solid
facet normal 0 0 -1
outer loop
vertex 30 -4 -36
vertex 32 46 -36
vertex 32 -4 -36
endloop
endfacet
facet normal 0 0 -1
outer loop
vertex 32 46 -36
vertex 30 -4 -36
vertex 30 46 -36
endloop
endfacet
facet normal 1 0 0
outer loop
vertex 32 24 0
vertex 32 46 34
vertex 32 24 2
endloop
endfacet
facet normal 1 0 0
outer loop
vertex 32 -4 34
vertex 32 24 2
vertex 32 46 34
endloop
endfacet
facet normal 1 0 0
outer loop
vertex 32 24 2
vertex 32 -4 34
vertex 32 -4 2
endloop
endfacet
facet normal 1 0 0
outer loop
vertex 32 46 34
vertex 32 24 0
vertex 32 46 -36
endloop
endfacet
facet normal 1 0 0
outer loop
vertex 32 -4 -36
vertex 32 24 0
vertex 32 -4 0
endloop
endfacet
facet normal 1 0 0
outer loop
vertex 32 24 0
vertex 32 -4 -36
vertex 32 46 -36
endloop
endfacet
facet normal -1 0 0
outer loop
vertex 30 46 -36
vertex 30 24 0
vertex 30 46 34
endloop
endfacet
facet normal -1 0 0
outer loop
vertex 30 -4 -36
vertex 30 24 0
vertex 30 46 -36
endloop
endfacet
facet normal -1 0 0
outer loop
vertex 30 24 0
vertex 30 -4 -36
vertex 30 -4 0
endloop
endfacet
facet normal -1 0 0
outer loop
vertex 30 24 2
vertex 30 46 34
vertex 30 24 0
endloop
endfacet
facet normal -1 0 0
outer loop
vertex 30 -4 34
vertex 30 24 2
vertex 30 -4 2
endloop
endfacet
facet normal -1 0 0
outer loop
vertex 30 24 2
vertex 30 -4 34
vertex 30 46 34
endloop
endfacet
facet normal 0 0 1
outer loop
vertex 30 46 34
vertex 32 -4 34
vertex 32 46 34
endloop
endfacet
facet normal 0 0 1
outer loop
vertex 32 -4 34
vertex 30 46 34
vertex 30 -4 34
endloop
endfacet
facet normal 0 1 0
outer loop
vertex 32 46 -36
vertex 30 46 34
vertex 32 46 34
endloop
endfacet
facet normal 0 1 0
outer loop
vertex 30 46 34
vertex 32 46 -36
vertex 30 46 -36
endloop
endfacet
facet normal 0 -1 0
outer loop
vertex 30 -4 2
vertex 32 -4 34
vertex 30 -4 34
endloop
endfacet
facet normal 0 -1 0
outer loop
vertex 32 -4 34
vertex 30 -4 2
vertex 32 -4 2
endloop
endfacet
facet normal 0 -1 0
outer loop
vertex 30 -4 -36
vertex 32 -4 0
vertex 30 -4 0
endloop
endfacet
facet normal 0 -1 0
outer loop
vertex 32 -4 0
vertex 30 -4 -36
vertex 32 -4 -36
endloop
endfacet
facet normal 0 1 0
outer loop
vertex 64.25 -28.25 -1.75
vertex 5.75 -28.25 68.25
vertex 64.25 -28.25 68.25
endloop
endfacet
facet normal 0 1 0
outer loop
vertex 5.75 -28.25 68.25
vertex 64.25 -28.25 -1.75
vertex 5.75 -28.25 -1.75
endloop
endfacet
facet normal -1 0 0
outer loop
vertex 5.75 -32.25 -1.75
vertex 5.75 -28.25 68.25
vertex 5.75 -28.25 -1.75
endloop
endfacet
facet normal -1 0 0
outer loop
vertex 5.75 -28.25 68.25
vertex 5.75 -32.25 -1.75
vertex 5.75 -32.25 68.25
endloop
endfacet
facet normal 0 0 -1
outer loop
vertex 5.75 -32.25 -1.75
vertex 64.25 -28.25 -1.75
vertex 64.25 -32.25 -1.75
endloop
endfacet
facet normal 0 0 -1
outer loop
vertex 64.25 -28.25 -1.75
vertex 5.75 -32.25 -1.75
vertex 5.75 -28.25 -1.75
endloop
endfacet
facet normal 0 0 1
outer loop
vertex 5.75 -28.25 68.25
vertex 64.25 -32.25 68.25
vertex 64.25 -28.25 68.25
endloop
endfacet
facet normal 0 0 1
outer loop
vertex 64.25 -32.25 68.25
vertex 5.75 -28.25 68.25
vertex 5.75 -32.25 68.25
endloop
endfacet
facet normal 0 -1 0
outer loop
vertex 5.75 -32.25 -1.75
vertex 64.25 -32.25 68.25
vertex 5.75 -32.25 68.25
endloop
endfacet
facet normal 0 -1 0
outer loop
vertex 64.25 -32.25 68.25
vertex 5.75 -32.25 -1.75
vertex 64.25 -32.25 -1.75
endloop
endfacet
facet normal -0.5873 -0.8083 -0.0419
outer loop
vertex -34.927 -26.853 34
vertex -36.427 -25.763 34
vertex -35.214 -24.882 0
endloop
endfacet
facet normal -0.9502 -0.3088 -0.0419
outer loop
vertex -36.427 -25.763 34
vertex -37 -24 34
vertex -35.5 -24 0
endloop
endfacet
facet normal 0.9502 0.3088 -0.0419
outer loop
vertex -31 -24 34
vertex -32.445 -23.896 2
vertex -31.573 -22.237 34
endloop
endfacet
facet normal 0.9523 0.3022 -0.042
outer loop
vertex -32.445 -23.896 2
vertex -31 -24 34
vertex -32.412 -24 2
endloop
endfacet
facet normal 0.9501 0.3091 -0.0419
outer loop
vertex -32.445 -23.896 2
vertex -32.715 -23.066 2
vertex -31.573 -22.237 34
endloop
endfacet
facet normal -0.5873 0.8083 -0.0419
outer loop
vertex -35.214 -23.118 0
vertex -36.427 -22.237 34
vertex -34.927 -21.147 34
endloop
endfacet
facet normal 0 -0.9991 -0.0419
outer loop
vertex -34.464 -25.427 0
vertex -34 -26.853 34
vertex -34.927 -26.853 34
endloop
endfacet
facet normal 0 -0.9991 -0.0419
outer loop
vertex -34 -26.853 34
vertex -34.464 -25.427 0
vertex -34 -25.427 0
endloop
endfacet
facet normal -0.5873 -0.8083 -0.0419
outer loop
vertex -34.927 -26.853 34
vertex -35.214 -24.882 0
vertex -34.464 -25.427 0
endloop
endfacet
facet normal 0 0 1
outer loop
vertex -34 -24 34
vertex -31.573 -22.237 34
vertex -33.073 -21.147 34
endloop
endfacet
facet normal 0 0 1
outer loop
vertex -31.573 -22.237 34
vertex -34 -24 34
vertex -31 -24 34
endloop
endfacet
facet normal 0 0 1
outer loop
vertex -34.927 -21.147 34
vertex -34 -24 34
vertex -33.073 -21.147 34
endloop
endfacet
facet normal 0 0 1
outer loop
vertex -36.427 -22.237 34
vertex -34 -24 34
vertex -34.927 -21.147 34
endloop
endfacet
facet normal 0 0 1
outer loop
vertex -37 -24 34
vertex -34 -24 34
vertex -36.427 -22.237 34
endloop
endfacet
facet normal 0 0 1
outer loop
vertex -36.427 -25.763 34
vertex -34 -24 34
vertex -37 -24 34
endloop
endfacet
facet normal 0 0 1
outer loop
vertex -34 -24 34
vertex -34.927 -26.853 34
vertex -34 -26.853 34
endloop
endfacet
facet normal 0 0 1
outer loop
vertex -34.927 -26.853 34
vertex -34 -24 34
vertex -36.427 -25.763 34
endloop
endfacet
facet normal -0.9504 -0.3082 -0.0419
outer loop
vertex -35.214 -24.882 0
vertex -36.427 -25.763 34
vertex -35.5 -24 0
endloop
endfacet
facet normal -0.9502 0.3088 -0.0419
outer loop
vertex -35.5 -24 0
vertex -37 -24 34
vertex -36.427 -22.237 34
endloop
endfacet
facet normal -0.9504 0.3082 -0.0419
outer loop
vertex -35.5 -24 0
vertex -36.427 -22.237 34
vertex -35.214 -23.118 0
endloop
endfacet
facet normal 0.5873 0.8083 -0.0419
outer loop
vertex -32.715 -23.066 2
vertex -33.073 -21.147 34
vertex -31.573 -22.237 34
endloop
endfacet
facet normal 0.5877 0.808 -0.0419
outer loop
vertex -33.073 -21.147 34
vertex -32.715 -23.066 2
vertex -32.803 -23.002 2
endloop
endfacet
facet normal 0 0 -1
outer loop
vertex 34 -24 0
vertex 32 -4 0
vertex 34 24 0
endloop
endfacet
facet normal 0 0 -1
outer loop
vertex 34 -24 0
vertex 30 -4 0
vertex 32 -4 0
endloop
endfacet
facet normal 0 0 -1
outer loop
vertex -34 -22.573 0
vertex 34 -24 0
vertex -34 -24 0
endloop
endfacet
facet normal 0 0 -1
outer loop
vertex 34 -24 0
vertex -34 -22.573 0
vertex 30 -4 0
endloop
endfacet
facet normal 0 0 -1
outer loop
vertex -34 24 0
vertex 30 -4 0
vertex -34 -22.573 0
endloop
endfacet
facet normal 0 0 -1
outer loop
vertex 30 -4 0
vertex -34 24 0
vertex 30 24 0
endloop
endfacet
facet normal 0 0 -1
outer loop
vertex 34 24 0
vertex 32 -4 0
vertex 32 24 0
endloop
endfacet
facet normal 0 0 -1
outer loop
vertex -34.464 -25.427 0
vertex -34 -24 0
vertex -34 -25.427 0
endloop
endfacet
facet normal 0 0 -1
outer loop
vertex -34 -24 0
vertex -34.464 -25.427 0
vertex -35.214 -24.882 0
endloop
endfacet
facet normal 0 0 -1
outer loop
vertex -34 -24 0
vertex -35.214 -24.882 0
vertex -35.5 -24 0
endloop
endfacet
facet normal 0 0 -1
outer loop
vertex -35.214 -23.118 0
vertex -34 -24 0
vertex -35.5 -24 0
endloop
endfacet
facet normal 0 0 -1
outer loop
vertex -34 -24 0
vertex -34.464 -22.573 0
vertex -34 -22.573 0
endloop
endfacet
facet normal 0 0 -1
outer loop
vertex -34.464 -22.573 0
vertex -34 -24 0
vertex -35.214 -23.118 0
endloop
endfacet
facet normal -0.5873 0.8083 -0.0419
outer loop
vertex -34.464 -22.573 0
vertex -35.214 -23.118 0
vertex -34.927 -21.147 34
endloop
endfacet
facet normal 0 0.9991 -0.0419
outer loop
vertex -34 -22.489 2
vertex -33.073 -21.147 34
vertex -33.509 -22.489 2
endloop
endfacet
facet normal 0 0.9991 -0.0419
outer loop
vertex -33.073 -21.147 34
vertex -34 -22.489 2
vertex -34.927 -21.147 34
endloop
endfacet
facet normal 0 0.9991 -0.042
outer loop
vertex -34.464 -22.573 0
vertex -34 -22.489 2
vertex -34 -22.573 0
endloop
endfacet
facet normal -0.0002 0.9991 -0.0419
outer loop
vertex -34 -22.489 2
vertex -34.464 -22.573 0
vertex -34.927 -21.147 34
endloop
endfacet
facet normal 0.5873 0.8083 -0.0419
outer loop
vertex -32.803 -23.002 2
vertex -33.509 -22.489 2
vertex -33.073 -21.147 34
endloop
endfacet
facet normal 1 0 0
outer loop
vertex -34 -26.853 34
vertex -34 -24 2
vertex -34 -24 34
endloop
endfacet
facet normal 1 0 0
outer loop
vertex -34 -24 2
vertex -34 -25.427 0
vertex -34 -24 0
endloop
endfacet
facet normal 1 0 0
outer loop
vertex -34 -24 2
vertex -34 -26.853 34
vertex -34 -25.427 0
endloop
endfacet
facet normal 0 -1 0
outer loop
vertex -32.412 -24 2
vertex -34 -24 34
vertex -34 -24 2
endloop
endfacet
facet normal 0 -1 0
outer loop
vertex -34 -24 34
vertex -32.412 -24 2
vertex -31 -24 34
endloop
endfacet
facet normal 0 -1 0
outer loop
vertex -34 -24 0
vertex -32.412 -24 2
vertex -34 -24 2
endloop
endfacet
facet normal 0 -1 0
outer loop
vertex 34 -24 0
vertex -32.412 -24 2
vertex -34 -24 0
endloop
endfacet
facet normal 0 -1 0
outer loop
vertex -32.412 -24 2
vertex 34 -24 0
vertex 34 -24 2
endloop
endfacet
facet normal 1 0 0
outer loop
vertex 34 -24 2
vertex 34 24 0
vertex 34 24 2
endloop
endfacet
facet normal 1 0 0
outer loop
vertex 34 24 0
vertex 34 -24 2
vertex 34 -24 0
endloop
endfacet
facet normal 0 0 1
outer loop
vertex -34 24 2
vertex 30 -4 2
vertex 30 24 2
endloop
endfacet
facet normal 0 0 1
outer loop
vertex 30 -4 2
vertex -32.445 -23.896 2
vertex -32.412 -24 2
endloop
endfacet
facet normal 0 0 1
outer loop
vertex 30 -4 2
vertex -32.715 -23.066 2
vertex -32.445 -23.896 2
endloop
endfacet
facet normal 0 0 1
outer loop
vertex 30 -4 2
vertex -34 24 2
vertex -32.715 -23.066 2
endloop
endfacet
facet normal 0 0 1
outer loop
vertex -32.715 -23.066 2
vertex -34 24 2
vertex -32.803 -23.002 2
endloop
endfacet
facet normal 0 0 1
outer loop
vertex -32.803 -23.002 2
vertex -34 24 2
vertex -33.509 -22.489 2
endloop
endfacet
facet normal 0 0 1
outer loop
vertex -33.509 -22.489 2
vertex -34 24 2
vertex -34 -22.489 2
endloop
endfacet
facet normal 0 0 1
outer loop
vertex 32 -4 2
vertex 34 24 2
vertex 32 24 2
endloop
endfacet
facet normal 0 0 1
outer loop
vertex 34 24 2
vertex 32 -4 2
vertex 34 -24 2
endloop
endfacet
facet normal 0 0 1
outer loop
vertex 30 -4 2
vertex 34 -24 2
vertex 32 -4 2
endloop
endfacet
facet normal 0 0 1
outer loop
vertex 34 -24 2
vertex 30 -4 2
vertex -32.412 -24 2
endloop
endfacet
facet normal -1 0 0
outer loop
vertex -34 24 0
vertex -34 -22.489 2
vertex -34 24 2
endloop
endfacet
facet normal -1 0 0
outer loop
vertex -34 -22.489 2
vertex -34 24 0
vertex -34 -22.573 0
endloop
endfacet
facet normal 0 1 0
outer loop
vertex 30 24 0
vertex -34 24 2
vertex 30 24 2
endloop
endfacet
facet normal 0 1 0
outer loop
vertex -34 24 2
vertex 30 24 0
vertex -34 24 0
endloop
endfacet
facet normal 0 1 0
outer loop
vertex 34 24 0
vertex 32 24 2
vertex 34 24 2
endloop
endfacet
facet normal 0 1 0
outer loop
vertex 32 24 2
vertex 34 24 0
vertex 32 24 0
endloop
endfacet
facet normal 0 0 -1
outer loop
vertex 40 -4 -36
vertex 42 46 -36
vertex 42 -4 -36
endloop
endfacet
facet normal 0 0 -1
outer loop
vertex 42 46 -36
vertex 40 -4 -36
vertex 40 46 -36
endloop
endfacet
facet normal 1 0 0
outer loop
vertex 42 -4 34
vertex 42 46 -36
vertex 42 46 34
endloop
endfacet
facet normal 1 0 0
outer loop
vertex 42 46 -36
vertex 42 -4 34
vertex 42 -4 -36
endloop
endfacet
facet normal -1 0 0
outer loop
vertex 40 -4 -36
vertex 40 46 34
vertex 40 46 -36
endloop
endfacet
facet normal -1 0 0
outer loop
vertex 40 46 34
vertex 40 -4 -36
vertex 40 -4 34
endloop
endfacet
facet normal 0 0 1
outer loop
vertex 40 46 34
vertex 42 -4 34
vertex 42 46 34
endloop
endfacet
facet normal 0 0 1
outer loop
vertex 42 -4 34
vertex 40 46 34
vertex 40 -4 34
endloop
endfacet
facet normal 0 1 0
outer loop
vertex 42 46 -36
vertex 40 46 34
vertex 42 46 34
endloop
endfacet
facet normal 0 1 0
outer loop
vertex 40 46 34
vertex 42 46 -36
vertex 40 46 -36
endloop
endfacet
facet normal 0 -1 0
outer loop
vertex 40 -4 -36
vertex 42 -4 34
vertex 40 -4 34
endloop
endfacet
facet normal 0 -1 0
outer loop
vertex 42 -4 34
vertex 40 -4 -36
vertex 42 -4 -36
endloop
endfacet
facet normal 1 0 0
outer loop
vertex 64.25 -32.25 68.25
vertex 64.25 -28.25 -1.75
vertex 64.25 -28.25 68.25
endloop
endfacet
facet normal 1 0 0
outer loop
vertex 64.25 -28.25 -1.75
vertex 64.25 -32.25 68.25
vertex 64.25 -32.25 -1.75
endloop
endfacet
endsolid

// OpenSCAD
// Dimensions for Part 1: Box (outer size 70x50x30mm, walls=2mm, floor=2mm)
box_outer_width = 70;    // Outer width
box_outer_depth = 50;    // Outer depth
box_height = 30;         // Total height including floor

// Part 1: Box (open top)
module box() {
    translate([-box_outer_width/2 + 1, -box_outer_depth/2 + 1, 0]) {
        // Floor (2mm thick)
        cube([box_outer_width - 2, box_outer_depth - 2, 2]);

        // Walls and top (2mm thick)
        difference() {
            cylinder(h=box_height + 4, r1=1.5, r2=3);
            rotate([90, 0, 0])
                cube([box_outer_width - 2, box_outer_depth - 2, box_height]);
        }
    }
}

// Dimensions for Part 2: Lid (plate + lip)
lid_plate_size = [70, 50];
lid_lip_inner_size = [65.6, 45.6]; // Clearance on each side
lid_lip_thickness = 1.5;
lid_lip_height = 4;

// Part 2: Lid (upside down)
module lid() {
    translate([-lid_plate_size[0]/2 + 1, -lid_plate_size[1]/2 + 1, 0]) {
        // Plate
        cube([lid_plate_size[0], lid_plate_size[1], 2]);

        // Lip cutout (4mm tall, 1.5mm thick)
        difference() {
            rotate([90, 0, 0])
                linear_extrude(height=lid_lip_height) {
                    polygon(points=[
                        [-lid_lip_inner_size[0]/2, -lid_plate_size[1]/2],
                        [ lid_lip_inner_size[0]/2, -lid_plate_size[1]/2],
                        [ lid_lip_inner_size[0]/2,  lid_plate_size[1]/2],
                        [-lid_lip_inner_size[0]/2,  lid_plate_size[1]/2]
                    ]);
                }
            rotate([90, 0, 0])
                linear_extrude(height=lid_lip_height) {
                    polygon(points=[
                        [-lid_plate_size[0]/2, -lid_plate_size[1]/2],
                        [ lid_plate_size[0]/2, -lid_plate_size[1]/2],
                        [ lid_plate_size[0]/2,  lid_plate_size[1]/2],
                        [-lid_plate_size[0]/2,  lid_plate_size[1]/2]
                    ]);
                }
        }

        // Cut out the lip material
        translate([-lid_lip_inner_size[0]/2 + lid_lip_thickness/2,
                  -lid_plate_size[1]/2 + lid_lip_thickness/2, 0])
            rotate([90, 0, 0])
            linear_extrude(height=lid_lip_height) {
                polygon(points=[
                    [-lid_plate_size[0]/2 + lid_lip_inner_size[0]/2,
                     -lid_plate_size[1]/2 + lid_lip_thickness/2],
                    [ lid_plate_size[0]/2 + lid_lip_inner_size[0]/2,
                     -lid_plate_size[1]/2 + lid_lip_thickness/2],
                    [ lid_plate_size[0]/2 + lid_lip_inner_size[0]/2,
                      lid_plate_size[1]/2 - lid_lip_thickness/2],
                    [-lid_plate_size[0]/2 + lid_lip_inner_size[0]/2,
                      lid_plate_size[1]/2 - lid_lip_thickness/2]
                ]);
            }
    }
}

// Assembly: Box and Lid (10mm gap)
translate([box_outer_width/2 - 5, box_outer_depth/2 - 5, 0]) {
    rotate([0, 90, 0])
        lid();
}

union() {
    box();
    translate([box_outer_width/2 + 5, box_outer_depth/2 - 5, 0])
        rotate([0, 90, 0])
            lid();
}
